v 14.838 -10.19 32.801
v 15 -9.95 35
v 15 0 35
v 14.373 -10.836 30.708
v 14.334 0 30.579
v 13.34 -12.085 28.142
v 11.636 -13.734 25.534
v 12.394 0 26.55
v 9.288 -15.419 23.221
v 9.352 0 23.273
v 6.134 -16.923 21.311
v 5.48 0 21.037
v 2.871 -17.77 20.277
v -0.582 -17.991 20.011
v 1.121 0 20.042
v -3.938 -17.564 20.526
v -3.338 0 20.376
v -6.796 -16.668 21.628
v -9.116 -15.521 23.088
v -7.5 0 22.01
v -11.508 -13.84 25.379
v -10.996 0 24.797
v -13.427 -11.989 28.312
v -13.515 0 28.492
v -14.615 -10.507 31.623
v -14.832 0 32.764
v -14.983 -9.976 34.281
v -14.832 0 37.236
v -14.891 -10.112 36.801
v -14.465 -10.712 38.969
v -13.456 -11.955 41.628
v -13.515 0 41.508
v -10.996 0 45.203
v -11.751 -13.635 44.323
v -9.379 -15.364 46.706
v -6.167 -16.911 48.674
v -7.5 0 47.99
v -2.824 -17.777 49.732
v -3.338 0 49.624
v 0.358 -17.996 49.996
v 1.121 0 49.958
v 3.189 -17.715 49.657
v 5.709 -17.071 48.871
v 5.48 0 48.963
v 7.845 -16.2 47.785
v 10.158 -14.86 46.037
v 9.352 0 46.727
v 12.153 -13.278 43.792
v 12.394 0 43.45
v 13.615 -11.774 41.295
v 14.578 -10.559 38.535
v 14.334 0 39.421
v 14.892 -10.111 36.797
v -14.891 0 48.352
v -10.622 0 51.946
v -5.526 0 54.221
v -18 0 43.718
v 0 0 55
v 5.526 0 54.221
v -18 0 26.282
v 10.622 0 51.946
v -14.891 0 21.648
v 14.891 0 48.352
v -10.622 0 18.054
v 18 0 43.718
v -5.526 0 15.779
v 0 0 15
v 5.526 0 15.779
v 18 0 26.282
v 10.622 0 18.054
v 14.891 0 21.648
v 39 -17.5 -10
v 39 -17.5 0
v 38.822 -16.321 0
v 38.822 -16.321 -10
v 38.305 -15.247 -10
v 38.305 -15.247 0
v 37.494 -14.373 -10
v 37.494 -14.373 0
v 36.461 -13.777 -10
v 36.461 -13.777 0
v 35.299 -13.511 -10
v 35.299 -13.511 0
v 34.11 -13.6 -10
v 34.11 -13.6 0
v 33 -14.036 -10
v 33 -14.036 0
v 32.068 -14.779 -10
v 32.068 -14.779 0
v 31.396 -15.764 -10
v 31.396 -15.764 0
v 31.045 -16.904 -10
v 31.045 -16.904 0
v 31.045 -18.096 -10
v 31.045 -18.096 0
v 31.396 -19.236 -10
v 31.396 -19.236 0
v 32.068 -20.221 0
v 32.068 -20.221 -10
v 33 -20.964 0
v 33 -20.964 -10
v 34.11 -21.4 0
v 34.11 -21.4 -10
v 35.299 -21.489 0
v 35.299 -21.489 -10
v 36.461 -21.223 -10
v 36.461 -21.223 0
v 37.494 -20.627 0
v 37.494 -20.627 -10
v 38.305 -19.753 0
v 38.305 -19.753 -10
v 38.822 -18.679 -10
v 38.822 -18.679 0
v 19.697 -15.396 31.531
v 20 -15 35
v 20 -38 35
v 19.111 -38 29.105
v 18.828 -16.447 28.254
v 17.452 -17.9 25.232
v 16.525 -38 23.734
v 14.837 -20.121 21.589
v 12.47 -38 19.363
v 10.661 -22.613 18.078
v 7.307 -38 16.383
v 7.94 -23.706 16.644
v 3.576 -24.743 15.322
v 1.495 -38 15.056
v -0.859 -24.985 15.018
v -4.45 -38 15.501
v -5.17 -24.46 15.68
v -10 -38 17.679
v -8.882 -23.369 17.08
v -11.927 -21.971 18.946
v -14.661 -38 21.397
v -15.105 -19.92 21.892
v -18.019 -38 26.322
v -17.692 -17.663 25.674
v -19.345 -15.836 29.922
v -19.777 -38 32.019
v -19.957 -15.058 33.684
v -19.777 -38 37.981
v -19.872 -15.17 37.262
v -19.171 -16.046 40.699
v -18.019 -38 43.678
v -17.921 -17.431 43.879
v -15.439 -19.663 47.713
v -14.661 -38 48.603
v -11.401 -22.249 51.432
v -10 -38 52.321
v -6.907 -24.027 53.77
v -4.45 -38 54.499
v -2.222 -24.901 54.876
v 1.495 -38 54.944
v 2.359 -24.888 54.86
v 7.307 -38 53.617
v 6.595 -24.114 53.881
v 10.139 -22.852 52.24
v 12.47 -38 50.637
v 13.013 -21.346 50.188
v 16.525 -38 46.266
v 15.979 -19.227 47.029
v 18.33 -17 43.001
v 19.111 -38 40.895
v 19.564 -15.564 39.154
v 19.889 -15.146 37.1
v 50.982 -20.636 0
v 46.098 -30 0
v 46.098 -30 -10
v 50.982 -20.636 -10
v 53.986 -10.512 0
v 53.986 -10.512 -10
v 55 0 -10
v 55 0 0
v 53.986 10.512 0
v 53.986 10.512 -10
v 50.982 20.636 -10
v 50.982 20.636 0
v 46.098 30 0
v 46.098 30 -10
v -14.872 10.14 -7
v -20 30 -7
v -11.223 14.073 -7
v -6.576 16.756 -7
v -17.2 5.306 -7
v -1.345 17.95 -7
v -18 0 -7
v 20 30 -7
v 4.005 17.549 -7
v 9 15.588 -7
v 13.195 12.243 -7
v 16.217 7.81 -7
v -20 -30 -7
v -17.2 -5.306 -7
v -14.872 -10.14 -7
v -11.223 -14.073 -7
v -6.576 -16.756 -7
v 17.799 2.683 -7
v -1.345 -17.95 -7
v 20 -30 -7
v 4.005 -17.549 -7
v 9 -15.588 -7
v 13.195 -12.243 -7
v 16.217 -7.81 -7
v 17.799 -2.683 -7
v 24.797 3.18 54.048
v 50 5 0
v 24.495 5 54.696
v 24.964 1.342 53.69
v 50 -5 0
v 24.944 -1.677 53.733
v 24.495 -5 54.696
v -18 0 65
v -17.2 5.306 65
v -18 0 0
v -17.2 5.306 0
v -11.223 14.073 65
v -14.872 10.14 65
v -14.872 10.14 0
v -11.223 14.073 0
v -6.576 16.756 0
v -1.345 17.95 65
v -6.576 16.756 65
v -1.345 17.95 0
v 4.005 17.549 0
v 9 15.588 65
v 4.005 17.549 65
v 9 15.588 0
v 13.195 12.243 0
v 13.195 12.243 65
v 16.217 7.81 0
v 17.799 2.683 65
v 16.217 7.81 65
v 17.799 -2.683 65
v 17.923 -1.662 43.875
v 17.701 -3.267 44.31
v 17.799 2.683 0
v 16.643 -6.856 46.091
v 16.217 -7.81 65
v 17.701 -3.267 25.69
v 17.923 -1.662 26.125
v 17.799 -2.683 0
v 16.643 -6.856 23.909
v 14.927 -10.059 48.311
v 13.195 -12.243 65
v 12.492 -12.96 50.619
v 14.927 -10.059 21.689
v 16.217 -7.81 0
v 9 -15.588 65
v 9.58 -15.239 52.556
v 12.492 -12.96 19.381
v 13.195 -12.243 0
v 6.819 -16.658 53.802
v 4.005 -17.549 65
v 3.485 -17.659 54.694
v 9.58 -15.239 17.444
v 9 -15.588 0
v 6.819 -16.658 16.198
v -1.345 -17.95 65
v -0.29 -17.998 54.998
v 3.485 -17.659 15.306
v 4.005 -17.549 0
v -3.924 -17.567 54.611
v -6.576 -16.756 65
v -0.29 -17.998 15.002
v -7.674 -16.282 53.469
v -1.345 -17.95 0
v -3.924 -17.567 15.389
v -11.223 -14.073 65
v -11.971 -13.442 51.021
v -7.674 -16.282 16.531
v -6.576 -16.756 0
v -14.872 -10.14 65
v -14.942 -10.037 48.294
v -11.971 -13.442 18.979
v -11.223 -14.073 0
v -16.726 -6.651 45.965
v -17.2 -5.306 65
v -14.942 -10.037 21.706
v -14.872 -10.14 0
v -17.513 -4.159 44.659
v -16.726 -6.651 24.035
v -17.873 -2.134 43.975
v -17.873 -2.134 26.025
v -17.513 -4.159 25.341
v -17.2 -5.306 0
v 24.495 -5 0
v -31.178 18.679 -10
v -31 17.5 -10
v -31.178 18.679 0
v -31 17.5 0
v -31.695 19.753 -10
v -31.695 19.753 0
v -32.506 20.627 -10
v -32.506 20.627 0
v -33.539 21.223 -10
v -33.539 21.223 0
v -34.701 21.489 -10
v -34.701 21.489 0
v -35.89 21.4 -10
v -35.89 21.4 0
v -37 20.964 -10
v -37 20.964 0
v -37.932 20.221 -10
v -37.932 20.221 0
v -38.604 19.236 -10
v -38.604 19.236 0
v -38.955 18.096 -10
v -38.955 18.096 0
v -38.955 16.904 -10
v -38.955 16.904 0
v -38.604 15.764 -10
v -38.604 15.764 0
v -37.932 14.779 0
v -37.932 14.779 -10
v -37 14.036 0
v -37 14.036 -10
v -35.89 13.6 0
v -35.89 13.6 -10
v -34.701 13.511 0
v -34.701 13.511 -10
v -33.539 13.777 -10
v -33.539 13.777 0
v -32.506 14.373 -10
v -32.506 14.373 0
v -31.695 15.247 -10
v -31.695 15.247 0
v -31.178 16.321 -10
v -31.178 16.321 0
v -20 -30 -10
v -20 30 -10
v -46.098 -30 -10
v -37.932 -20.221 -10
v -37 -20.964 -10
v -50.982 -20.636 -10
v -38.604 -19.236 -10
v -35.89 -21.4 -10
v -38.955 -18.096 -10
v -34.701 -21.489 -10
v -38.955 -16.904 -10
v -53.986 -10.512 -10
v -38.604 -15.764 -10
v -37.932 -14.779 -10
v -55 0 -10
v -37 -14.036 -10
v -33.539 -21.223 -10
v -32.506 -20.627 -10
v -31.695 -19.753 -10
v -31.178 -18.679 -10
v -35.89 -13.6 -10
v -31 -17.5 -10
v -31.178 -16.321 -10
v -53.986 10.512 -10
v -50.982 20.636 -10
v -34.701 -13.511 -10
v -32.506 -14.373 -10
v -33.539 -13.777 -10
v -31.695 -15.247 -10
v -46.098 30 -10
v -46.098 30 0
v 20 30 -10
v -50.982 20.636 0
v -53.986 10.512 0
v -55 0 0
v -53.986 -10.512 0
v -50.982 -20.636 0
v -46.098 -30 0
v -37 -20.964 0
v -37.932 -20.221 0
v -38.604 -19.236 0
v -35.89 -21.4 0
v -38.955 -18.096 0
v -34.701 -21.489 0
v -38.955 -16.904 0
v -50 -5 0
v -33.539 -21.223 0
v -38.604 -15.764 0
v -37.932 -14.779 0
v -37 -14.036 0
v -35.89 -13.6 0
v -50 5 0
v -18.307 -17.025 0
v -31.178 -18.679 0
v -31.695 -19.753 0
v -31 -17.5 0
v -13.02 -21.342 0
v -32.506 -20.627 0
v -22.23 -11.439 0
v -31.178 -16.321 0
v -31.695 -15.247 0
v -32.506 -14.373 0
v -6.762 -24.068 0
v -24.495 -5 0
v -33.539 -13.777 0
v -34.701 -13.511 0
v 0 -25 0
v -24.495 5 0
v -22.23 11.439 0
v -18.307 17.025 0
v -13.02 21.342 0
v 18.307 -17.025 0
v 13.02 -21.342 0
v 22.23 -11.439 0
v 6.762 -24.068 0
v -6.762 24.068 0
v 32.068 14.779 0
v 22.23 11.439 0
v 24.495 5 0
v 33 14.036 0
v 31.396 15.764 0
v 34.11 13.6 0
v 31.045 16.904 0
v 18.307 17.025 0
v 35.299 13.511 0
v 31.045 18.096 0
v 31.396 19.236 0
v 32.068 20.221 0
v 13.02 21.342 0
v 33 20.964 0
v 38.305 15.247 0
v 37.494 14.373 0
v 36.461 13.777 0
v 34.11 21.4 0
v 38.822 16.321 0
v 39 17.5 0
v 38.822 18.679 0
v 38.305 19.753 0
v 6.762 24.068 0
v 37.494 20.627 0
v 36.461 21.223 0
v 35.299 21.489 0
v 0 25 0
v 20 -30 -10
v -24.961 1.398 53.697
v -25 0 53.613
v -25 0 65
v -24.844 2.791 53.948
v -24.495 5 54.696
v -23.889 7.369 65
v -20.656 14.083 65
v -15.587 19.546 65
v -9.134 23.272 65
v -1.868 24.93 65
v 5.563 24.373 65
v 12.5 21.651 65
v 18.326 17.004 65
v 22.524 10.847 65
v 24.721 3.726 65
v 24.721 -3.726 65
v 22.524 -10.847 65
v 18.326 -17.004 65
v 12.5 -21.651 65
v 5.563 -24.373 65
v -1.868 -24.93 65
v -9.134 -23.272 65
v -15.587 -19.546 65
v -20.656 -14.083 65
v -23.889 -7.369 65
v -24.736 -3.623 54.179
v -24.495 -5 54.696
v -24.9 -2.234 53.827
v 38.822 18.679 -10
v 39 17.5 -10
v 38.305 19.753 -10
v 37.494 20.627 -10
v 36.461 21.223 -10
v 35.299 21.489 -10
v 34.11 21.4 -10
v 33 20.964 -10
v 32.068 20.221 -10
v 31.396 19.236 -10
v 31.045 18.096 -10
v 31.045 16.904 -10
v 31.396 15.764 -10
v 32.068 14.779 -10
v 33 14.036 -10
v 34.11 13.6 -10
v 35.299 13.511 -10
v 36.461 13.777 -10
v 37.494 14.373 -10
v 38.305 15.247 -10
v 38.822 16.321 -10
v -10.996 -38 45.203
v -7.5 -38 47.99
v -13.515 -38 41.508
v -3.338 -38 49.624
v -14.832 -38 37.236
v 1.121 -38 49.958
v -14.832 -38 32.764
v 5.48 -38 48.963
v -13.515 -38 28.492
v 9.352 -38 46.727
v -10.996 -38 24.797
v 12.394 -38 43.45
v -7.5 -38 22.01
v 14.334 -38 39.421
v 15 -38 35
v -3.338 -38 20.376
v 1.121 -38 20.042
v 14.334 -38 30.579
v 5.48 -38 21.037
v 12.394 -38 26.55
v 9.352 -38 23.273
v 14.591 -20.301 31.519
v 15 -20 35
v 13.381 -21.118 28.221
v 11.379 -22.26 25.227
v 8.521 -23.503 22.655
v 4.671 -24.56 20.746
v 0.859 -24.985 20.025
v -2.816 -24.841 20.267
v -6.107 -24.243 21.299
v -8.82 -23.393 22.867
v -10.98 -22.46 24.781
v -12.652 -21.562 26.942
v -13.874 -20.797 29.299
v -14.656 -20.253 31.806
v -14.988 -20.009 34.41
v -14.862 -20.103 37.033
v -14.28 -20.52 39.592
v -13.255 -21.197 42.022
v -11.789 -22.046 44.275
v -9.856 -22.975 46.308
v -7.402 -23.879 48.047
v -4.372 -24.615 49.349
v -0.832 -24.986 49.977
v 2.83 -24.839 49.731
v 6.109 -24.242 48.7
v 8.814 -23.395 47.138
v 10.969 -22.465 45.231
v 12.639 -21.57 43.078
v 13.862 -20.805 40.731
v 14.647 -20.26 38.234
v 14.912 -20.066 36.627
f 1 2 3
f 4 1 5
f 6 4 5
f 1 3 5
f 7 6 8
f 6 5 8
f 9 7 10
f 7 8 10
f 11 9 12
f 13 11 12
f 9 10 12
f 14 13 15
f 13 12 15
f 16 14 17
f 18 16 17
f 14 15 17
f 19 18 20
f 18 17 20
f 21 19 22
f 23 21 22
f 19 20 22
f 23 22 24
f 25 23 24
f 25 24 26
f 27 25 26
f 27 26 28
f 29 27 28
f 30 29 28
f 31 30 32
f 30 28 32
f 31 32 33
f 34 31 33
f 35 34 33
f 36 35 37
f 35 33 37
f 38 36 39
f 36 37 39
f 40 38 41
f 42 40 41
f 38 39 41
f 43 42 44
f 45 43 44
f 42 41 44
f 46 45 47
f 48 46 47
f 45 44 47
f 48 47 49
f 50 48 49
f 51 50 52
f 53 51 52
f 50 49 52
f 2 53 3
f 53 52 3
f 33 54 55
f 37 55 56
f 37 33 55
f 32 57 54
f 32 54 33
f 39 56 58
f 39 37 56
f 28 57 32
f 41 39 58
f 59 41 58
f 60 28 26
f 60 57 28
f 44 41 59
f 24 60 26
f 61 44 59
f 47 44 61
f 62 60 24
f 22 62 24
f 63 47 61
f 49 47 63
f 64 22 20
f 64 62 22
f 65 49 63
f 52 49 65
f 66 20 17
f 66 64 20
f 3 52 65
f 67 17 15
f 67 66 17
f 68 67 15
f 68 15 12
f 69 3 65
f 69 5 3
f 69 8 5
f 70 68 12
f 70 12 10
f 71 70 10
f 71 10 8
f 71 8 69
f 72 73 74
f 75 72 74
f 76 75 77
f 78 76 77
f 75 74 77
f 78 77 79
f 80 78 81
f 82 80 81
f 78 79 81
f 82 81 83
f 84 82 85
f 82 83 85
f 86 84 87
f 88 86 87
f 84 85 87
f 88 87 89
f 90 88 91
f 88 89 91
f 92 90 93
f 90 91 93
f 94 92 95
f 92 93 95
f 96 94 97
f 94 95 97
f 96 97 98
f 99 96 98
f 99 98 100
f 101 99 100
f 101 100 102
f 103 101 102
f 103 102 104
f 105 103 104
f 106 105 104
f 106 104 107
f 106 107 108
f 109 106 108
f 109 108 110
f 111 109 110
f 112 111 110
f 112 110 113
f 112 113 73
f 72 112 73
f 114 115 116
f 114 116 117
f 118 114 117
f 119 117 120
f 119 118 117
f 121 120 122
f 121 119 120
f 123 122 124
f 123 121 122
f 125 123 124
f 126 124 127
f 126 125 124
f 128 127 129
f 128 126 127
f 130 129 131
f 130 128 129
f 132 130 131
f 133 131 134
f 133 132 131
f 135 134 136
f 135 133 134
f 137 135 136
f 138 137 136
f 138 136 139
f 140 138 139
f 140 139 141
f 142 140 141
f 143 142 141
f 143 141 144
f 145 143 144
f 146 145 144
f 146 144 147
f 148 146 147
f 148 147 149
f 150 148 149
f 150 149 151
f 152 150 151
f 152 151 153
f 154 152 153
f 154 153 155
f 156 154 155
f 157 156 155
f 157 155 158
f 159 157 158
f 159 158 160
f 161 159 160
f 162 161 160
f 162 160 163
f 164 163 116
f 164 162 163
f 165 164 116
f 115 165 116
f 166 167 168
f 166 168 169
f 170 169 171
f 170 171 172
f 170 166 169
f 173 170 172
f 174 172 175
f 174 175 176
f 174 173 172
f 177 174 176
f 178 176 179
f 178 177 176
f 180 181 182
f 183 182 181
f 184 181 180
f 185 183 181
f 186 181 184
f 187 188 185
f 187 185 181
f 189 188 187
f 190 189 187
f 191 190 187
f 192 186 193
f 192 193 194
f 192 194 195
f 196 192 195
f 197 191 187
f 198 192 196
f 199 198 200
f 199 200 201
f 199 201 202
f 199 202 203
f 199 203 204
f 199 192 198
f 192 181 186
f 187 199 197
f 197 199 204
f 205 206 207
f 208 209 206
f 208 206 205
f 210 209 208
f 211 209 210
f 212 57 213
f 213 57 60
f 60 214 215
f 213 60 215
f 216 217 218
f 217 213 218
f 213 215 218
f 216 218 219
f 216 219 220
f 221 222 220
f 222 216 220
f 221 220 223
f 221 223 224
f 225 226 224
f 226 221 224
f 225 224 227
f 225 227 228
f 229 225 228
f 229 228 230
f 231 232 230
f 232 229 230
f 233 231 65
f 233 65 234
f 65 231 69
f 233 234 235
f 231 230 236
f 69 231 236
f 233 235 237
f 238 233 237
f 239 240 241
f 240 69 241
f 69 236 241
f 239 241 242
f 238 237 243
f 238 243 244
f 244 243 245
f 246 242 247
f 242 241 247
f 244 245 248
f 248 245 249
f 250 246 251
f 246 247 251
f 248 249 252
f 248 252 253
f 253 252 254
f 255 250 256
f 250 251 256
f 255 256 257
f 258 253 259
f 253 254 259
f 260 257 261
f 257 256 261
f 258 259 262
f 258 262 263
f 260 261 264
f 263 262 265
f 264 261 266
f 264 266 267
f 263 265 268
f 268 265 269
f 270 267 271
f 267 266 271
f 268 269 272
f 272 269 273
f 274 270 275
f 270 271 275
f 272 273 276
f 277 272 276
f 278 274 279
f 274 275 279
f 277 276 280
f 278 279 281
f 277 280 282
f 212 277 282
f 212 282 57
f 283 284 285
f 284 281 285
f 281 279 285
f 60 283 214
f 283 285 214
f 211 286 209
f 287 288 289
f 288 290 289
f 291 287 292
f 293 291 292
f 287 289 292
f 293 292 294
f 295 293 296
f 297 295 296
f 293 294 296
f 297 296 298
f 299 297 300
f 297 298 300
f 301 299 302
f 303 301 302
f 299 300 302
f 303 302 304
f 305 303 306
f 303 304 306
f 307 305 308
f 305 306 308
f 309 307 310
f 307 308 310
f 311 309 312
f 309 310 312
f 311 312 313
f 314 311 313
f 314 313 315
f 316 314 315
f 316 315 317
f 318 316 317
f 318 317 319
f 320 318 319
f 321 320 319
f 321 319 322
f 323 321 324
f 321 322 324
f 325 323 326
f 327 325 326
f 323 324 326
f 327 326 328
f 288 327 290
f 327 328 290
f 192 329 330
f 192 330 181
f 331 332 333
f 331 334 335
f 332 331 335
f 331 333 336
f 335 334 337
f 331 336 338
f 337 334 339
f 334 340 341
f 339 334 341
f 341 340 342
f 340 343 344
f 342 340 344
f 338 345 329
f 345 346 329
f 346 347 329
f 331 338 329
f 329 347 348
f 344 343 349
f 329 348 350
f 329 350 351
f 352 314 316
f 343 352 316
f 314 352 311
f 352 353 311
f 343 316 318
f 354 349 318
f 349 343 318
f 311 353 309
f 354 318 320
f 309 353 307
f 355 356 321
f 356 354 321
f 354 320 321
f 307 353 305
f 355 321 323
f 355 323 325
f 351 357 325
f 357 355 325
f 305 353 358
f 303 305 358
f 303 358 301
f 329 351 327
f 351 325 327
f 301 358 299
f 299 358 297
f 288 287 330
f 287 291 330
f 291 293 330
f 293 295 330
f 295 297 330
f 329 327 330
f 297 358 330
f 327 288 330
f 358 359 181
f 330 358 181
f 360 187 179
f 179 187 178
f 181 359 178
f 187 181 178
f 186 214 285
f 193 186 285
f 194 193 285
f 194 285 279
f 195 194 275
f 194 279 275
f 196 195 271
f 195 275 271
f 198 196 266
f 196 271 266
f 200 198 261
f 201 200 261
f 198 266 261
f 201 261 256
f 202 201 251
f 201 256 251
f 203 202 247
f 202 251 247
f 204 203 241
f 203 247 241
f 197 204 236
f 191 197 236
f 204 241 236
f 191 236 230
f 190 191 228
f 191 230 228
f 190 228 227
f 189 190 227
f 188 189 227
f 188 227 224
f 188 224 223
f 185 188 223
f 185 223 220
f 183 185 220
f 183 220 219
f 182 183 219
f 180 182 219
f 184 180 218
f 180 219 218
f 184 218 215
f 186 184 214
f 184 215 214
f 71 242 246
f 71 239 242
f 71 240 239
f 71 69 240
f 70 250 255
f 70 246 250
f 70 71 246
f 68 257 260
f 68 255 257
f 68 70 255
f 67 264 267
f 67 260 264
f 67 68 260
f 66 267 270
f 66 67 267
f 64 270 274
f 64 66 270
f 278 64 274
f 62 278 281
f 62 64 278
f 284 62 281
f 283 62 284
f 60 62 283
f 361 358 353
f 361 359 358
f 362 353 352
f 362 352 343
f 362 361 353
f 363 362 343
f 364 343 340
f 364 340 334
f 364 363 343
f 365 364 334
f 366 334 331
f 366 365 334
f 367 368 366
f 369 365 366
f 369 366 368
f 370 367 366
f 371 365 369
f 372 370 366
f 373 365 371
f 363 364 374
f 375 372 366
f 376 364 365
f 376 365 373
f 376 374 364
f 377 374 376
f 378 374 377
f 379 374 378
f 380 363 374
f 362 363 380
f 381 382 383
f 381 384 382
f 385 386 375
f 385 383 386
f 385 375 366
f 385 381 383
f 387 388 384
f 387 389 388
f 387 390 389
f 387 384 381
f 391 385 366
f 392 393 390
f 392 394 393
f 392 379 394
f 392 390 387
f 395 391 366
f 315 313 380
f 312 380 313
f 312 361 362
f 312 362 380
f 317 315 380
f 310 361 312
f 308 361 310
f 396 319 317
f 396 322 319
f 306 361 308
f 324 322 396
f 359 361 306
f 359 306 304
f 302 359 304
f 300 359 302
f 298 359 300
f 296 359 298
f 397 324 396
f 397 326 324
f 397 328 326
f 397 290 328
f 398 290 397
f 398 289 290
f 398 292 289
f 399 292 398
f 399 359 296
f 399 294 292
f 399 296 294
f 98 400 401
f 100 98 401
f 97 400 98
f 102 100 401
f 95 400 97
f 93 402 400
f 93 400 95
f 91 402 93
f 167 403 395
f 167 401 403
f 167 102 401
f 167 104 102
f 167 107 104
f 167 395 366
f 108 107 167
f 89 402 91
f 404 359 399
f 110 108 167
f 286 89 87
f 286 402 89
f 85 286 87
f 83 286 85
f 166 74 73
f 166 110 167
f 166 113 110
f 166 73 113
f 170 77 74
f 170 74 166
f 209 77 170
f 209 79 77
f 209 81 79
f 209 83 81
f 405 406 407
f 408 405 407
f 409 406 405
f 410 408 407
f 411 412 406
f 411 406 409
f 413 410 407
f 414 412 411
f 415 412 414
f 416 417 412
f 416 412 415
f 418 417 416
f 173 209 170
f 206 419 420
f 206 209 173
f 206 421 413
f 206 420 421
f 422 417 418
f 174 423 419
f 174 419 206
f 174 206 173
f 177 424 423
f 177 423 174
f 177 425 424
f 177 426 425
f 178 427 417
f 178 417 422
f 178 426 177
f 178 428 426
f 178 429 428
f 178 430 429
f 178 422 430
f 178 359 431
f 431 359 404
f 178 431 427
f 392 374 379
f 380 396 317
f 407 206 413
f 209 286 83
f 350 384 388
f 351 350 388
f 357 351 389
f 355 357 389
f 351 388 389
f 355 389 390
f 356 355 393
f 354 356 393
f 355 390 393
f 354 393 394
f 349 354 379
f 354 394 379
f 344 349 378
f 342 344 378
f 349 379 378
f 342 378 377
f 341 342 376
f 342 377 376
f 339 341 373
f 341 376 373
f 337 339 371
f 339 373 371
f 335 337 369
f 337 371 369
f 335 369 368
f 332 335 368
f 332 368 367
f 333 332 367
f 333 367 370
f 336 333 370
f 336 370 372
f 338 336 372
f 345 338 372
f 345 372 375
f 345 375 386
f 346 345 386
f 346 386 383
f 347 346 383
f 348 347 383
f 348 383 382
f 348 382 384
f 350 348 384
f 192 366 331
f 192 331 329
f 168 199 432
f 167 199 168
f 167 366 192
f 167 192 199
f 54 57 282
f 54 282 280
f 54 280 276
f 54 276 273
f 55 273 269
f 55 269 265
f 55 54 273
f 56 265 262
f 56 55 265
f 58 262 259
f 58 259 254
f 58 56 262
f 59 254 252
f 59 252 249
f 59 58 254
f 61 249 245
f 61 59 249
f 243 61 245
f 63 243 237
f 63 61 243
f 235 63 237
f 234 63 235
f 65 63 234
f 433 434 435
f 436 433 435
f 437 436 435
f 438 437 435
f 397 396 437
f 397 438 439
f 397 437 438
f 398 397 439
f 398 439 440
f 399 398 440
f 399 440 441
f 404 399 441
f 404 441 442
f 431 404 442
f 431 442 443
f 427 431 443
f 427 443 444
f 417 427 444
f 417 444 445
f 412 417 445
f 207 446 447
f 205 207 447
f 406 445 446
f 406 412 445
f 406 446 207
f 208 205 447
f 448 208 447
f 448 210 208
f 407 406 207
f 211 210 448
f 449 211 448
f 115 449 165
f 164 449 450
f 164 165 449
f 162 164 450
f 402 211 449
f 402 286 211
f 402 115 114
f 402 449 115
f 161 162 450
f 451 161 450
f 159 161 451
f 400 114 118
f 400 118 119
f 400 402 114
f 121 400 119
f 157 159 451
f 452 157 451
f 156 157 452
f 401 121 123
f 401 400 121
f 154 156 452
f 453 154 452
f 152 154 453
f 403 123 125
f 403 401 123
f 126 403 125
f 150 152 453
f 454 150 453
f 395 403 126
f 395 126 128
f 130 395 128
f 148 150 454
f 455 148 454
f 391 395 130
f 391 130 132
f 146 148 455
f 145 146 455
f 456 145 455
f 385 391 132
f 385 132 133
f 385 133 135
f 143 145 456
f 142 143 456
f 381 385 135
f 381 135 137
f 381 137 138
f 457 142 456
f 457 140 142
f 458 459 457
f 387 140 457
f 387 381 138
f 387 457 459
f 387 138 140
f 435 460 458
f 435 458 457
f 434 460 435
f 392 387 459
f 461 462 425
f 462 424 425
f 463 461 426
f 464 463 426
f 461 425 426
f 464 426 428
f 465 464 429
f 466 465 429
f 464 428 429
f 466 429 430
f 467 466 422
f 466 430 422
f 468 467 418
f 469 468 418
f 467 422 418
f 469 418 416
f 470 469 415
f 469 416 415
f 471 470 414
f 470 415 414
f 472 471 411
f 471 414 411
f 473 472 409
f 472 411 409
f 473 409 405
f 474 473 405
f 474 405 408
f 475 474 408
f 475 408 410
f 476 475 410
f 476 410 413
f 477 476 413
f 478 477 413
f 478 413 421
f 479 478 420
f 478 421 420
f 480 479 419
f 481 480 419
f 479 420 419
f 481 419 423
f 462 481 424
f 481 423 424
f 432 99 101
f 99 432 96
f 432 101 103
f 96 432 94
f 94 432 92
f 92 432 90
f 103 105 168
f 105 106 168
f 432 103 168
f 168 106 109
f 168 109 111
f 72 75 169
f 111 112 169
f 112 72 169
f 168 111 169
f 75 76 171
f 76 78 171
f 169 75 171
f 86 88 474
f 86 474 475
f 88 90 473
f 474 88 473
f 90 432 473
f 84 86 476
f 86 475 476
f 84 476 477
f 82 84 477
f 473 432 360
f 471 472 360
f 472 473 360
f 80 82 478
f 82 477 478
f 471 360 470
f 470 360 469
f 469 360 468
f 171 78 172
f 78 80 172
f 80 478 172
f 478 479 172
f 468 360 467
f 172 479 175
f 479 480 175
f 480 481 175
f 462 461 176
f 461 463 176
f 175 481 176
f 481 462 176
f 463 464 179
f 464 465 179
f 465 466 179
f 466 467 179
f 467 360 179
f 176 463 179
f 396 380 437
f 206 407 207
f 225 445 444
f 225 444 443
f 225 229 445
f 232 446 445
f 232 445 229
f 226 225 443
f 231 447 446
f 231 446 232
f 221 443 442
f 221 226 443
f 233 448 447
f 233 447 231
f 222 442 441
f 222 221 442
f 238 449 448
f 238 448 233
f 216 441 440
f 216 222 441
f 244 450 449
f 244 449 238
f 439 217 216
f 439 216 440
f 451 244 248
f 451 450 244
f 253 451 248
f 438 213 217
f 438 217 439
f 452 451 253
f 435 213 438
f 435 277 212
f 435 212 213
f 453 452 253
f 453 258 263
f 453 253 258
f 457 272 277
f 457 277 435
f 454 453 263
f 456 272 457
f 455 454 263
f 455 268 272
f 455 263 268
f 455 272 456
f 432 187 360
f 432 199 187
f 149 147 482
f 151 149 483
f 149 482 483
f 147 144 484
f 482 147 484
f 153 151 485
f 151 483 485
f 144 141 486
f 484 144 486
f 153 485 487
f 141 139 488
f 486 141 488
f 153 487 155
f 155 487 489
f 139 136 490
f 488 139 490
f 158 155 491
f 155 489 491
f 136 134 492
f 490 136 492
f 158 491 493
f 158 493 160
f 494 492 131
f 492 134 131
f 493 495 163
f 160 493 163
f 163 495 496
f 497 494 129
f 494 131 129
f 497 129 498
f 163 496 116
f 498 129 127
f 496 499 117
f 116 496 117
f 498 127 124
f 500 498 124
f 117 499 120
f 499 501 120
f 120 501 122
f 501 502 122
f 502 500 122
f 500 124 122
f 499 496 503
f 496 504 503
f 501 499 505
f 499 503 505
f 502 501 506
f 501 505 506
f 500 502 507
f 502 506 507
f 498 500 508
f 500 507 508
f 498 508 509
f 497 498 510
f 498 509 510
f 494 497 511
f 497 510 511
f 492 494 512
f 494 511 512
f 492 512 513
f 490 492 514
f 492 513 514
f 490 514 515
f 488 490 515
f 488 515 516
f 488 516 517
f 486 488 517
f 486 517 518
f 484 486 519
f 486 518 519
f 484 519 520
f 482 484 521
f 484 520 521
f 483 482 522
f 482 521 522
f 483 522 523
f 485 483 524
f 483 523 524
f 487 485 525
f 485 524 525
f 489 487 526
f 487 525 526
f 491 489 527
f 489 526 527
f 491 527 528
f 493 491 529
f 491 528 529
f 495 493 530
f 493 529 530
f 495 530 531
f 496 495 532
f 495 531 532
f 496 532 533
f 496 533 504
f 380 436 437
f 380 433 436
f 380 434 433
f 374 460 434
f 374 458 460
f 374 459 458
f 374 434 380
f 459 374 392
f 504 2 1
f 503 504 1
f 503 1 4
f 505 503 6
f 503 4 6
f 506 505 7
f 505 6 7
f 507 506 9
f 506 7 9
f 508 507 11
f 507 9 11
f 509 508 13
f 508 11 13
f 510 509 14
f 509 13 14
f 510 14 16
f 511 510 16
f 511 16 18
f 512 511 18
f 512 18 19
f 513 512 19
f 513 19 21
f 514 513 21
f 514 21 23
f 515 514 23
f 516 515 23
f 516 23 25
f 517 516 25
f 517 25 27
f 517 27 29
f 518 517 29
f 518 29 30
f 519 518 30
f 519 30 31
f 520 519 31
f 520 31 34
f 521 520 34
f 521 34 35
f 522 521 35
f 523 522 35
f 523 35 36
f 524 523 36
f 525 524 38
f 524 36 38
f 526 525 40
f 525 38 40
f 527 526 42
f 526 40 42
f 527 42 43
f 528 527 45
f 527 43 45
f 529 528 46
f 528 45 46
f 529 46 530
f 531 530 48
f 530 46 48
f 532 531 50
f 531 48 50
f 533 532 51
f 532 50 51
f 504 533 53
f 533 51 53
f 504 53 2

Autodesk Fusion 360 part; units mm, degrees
sketch "草图1" plane through (0, 0, 0) normal (0, 0, 1) x (1, 0, 0)
  line L0 (-46.0977, 30) -> (46.0977, 30)
  line L1 (-46.0977, -30) -> (46.0977, -30)
  line L2 (-130, 0) -> (170, 0) construction
  line L3 (0, 120) -> (0, -120) construction
  circle A0 centre (-35, 17.5) radius 4
  circle A1 centre (35, 17.5) radius 4
  circle A2 centre (35, -17.5) radius 4
  circle A3 centre (-35, -17.5) radius 4
  arc A4 (46.0977, -30) -> (46.0977, 30) centre (0, 0) ccw
  arc A5 (-46.0977, 30) -> (-46.0977, -30) centre (0, 0) ccw
  dimension "d1" = 110
  dimension "d2" = 60
  dimension "d3" = 8
  dimension "d4" = 35
  dimension "d5" = 70
extrude "拉伸1" add sketch "草图1" against normal blind 10 makes body 1
sketch "草图2" plane through (0, -30, 0) normal (0, -1, 0) x (1, 0, 0)
  line L0 (46.0977, 0) -> (-46.0977, 0)
  line L1 (-46.0977, 0) -> (-46.0977, -10)
  line L2 (-46.0977, -10) -> (46.0977, -10)
  line L3 (46.0977, -10) -> (46.0977, 0)
  line L4 (-46.0977, 0) -> (46.0977, 0)
  line L5 (46.0977, 0) -> (46.0977, -10)
  line L6 (46.0977, -10) -> (-46.0977, -10)
  line L7 (-46.0977, -10) -> (-46.0977, 0)
  line L8 (-20, -7) -> (20, -7)
  line L9 (20, -7) -> (20, -10)
  line L10 (20, -10) -> (-20, -10)
  line L11 (-20, -10) -> (-20, -7)
  line L12 (0, 5) -> (0, -26.915) construction
  dimension "d8" = 40
  dimension "d9" = 3
extrude "拉伸2" cut sketch "草图2" against normal blind 80 contours L2 L6 L8 L9 L10 L11 bodies 1
sketch "草图3" plane through (0, 0, 0) normal (0, 0, 1) x (-1, 0, 0)
  circle A0 centre (35, 17.5) radius 4
  circle A1 centre (-35, -17.5) radius 4
  circle A2 centre (35, -17.5) radius 4
  circle A3 centre (-35, 17.5) radius 4
  arc A4 (46.0977, -30) -> (46.0977, 30) centre (0, 0) ccw
  line L0 (46.0977, 30) -> (-46.0977, 30)
  arc A5 (-46.0977, 30) -> (-46.0977, -30) centre (0, 0) ccw
  line L1 (-46.0977, -30) -> (46.0977, -30)
  circle A6 centre (0, 0) radius 25
  circle A7 centre (0, 0) radius 18
  dimension "d12" = 50
  dimension "d13" = 36
extrude "拉伸3" cut sketch "草图3" against normal blind 45 contours A7 bodies 1
extrude "拉伸4" add sketch "草图3" along normal blind 65 contours A6 bodies 1
sketch "草图4" plane through (0, 0, 0) normal (0, 1, 0) x (1, 0, 0)
  circle A0 centre (0, -35) radius 20
  circle A1 centre (0, -35) radius 15
  line L0 (-25, -65) -> (25, -65)
  dimension "d18" = 40
  dimension "d19" = 30
  dimension "d20" = 30
extrude "拉伸5" add sketch "草图4" against normal blind 38 bodies 1
extrude "拉伸6" cut sketch "草图4" against normal blind 60 contours A1 bodies 1
sketch "草图5" plane through (0, 0, 0) normal (0, 1, 0) x (1, 0, 0)
  line L0 (50, 0) -> (19.69, -65)
  line L1 (-19.69, -65) -> (-50, 0)
  line L2 (-19.69, -65) -> (-19.69, 0)
  line L3 (19.69, -65) -> (19.69, 0)
  line L4 (-60, 0) -> (-19.69, 0) construction
  line L5 (19.69, 0) -> (60, 0) construction
  line L6 (-50, 0) -> (-19.69, 0)
  line L7 (19.69, 0) -> (50, 0)
  dimension "d25" = 100
  dimension "d26" = 65
extrude "拉伸7" add sketch "草图5" along normal mid plane 10 separate body makes body 2 at (-29.7933, 5, 21.6667) makes body 3 at (29.7933, 5, 21.6667)
combine "合并1" operation add target body 1 tool bodies 3 2
